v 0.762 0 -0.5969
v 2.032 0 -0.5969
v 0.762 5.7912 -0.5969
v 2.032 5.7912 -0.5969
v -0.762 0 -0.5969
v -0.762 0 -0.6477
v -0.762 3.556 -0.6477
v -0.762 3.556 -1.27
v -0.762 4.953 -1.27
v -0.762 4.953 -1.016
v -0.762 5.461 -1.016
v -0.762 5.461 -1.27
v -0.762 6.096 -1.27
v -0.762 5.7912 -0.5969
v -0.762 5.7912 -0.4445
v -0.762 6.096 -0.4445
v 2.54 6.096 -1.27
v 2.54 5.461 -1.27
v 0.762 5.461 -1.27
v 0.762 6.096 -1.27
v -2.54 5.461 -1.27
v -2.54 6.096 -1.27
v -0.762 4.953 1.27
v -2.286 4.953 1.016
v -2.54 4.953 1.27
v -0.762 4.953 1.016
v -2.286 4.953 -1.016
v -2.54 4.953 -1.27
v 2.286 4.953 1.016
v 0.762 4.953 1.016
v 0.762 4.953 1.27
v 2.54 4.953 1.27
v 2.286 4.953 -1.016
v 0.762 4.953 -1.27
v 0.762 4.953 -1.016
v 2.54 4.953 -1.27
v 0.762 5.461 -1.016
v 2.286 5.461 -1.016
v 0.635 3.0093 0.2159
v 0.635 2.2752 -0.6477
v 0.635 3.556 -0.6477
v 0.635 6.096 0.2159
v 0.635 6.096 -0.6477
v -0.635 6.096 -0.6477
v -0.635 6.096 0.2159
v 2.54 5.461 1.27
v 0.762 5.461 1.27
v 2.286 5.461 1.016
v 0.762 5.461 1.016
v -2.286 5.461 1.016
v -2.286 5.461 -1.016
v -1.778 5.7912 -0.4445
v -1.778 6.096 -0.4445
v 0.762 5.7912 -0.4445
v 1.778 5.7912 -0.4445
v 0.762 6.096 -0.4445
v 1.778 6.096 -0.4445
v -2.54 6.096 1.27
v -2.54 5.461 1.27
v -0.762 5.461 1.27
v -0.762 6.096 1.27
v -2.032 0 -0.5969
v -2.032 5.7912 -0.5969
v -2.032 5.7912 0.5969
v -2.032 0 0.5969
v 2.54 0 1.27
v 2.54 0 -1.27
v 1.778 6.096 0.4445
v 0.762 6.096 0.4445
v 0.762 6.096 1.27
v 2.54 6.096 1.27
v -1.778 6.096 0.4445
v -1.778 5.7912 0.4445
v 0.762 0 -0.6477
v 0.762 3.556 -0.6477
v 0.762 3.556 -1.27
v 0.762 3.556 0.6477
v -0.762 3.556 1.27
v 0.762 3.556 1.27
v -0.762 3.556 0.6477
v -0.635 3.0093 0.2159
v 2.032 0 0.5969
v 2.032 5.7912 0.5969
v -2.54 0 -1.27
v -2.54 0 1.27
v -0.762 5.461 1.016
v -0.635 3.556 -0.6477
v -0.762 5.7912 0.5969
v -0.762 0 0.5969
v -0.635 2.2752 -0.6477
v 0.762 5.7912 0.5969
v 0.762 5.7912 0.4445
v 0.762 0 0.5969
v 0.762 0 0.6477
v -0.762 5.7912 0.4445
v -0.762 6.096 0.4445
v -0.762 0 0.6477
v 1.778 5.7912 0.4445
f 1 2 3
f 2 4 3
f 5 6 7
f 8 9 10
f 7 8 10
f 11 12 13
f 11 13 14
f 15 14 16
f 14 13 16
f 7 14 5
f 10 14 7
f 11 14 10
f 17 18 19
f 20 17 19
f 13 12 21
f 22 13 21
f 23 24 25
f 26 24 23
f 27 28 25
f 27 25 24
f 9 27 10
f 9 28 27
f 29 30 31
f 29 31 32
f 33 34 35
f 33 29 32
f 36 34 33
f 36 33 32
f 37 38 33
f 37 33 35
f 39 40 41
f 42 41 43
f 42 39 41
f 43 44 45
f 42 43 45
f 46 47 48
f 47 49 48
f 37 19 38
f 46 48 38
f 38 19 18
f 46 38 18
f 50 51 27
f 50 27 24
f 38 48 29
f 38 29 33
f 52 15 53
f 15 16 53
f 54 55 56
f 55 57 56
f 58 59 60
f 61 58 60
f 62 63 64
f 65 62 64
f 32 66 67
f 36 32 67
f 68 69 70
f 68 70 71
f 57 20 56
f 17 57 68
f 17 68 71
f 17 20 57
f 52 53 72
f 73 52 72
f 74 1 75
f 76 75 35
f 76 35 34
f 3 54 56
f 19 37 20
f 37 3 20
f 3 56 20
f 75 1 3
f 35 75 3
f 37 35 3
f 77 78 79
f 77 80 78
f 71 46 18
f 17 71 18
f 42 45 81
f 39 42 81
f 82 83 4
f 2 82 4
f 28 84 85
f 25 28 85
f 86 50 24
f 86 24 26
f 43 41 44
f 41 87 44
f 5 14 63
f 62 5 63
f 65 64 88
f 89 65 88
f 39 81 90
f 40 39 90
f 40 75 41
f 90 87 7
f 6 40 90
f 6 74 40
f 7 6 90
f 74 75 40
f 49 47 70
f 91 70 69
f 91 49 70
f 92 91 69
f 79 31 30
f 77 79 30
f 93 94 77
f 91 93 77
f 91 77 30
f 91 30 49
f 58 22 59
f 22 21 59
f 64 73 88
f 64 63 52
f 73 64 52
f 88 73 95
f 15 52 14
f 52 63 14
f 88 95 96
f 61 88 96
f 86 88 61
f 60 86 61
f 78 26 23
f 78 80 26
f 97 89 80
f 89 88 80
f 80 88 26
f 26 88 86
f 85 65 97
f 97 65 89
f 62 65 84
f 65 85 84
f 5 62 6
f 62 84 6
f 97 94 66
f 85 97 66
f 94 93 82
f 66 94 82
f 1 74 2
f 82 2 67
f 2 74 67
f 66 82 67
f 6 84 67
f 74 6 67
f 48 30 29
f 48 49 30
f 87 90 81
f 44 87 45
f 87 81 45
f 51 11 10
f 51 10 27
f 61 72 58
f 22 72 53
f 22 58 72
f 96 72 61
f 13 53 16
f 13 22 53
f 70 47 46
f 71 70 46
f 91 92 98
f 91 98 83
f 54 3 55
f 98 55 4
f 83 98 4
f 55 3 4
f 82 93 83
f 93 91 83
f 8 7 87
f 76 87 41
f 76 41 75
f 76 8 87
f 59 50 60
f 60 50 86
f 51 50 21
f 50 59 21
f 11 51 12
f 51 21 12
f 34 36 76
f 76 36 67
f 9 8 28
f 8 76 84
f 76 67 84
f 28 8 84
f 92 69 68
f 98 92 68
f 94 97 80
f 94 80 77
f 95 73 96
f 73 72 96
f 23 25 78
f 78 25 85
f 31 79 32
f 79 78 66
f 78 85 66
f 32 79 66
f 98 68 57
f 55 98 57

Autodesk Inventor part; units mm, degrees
sketch "Sketch_1" plane through (0, 0, 0) normal (0, 1, 0) x (1, 0, 0)
  line L0 (-2.54, 1.27) -> (-2.54, -1.27)
  line L1 (-2.54, -1.27) -> (2.54, -1.27)
  line L2 (2.54, -1.27) -> (2.54, 1.27)
  line L3 (2.54, 1.27) -> (-2.54, 1.27)
extrude "Extrusion1" add sketch "Sketch_1" along normal blind 6.096
sketch "Sketch_2" plane through (0, 5.461, 0) normal (0, 1, 0) x (1, 0, 0)
  line L0 (-2.794, 2.54) -> (-2.794, -2.54)
  line L1 (-2.794, -2.54) -> (2.794, -2.54)
  line L2 (2.794, -2.54) -> (2.794, 2.54)
  line L3 (2.794, 2.54) -> (-2.794, 2.54)
  line L4 (-2.286, 1.016) -> (-2.286, -1.016)
  line L5 (-2.286, -1.016) -> (2.286, -1.016)
  line L6 (2.286, -1.016) -> (2.286, 1.016)
  line L7 (2.286, 1.016) -> (-2.286, 1.016)
extrude "Extrusion2" cut sketch "Sketch_2" against normal blind 0.508
sketch "Sketch_3" plane through (0, 6.096, 0) normal (0, 1, 0) x (1, 0, 0)
  line L0 (-0.762, 1.27) -> (-0.762, -1.27)
  line L1 (-0.762, -1.27) -> (0.762, -1.27)
  line L2 (0.762, -1.27) -> (0.762, 1.27)
  line L3 (0.762, 1.27) -> (-0.762, 1.27)
extrude "Extrusion3" cut sketch "Sketch_3" against normal blind 2.54
sketch "Sketch_4" plane through (0, 6.096, 0) normal (0, 1, 0) x (1, 0, 0)
  line L0 (-1.778, 0.4445) -> (-1.778, -0.4445)
  line L1 (-1.778, -0.4445) -> (1.778, -0.4445)
  line L2 (1.778, -0.4445) -> (1.778, 0.4445)
  line L3 (1.778, 0.4445) -> (-1.778, 0.4445)
extrude "Extrusion4" cut sketch "Sketch_4" against normal blind 6.096
sketch "Sketch_5" plane through (0, 5.7912, 0) normal (0, 1, 0) x (1, 0, 0)
  line L0 (-2.032, 0.5969) -> (-2.032, -0.5969)
  line L1 (-2.032, -0.5969) -> (2.032, -0.5969)
  line L2 (2.032, -0.5969) -> (2.032, 0.5969)
  line L3 (2.032, 0.5969) -> (-2.032, 0.5969)
extrude "Extrusion5" cut sketch "Sketch_5" against normal blind 6.096
sketch "Sketch_8" plane through (0, 0, 0) normal (0, 1, 0) x (-1, 0, 0)
  line L0 (0.762, -0.6477) -> (0.762, 0.6477)
  line L1 (0.762, 0.6477) -> (-0.762, 0.6477)
  line L2 (-0.762, 0.6477) -> (-0.762, -0.6477)
  line L3 (-0.762, -0.6477) -> (0.762, -0.6477)
extrude "Extrusion6" cut sketch "Sketch_8" along normal blind 3.556
sketch "Sketch_6" plane through (0, 0, 0) normal (1, 0, 0) x (0, 1, 0)
  line L0 (3.0093, 0.2159) -> (2.2752, -0.6477)
  line L1 (2.2752, -0.6477) -> (6.096, -0.6477)
  line L2 (6.096, -0.6477) -> (6.096, 0.2159)
  line L3 (6.096, 0.2159) -> (3.0093, 0.2159)
extrude "Extrusion7" add sketch "Sketch_6" along normal mid plane 1.27
ref_plane "body_to_dummy_XY" through (0, 0, 0) normal (0, -1, 0) x (1, 0, 0)
ref_plane "body_to_dummy_YZ" through (0, 0, 0) normal (1, 0, 0) x (0, 0, 1)
ref_plane "body_to_dummy_ZX" through (0, 0, 0) normal (0, 0, 1) x (0, -1, 0)
properties part number "SNT-100-BK_body"
